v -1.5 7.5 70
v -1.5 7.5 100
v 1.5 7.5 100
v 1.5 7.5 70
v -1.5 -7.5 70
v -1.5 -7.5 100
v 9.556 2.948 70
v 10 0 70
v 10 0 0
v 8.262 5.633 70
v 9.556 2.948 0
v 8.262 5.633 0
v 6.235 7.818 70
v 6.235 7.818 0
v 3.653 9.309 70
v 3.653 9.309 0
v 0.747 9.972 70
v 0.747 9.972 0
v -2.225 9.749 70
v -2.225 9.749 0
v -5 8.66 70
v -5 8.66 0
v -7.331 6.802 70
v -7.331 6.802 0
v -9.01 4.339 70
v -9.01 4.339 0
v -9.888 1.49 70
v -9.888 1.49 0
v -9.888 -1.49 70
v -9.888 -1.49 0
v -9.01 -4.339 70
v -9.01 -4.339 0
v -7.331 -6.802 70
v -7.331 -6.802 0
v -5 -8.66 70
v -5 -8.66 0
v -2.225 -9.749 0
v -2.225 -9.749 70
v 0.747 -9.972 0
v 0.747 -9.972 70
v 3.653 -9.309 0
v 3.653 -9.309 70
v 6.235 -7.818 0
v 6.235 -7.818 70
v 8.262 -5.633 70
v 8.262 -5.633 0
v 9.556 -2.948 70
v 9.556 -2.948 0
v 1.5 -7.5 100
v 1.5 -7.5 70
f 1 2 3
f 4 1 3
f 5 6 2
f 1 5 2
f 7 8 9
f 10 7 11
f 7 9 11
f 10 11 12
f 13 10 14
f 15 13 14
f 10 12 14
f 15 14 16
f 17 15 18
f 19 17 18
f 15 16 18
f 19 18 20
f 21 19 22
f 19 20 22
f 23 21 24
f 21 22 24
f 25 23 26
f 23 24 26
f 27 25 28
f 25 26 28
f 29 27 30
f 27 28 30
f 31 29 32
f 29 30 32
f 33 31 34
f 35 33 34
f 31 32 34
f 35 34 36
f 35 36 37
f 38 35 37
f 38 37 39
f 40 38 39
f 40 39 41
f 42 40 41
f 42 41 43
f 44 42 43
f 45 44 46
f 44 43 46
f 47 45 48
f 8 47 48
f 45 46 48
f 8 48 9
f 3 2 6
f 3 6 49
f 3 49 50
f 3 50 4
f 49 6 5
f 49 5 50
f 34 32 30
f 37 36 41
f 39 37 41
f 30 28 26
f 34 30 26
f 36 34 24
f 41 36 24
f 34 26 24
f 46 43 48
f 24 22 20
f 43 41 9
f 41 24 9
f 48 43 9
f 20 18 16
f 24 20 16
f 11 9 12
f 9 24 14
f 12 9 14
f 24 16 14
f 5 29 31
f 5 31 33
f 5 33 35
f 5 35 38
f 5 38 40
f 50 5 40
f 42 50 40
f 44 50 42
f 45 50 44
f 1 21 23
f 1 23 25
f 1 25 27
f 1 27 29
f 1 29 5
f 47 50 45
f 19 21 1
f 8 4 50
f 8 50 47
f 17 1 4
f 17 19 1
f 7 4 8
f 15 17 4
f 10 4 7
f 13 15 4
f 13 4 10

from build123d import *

# Parameters (mm, degrees)
F2_W     = 3
F2_H     = 15
F0_DEPTH = 100
F2_R     = 10
F1_DEPTH = 70


with BuildPart() as f0:
    # F2 (on Top) → F0 (new body)
    with BuildSketch(Plane.XY):
        Rectangle(F2_W, F2_H)
    extrude(amount=F0_DEPTH)

    # F2 (on Top) → F1 (join)
    with BuildSketch(Plane.XY):
        Circle(F2_R)
        Rectangle(F2_W, F2_H, mode=Mode.SUBTRACT)
    extrude(amount=F1_DEPTH)


solid = f0.part
